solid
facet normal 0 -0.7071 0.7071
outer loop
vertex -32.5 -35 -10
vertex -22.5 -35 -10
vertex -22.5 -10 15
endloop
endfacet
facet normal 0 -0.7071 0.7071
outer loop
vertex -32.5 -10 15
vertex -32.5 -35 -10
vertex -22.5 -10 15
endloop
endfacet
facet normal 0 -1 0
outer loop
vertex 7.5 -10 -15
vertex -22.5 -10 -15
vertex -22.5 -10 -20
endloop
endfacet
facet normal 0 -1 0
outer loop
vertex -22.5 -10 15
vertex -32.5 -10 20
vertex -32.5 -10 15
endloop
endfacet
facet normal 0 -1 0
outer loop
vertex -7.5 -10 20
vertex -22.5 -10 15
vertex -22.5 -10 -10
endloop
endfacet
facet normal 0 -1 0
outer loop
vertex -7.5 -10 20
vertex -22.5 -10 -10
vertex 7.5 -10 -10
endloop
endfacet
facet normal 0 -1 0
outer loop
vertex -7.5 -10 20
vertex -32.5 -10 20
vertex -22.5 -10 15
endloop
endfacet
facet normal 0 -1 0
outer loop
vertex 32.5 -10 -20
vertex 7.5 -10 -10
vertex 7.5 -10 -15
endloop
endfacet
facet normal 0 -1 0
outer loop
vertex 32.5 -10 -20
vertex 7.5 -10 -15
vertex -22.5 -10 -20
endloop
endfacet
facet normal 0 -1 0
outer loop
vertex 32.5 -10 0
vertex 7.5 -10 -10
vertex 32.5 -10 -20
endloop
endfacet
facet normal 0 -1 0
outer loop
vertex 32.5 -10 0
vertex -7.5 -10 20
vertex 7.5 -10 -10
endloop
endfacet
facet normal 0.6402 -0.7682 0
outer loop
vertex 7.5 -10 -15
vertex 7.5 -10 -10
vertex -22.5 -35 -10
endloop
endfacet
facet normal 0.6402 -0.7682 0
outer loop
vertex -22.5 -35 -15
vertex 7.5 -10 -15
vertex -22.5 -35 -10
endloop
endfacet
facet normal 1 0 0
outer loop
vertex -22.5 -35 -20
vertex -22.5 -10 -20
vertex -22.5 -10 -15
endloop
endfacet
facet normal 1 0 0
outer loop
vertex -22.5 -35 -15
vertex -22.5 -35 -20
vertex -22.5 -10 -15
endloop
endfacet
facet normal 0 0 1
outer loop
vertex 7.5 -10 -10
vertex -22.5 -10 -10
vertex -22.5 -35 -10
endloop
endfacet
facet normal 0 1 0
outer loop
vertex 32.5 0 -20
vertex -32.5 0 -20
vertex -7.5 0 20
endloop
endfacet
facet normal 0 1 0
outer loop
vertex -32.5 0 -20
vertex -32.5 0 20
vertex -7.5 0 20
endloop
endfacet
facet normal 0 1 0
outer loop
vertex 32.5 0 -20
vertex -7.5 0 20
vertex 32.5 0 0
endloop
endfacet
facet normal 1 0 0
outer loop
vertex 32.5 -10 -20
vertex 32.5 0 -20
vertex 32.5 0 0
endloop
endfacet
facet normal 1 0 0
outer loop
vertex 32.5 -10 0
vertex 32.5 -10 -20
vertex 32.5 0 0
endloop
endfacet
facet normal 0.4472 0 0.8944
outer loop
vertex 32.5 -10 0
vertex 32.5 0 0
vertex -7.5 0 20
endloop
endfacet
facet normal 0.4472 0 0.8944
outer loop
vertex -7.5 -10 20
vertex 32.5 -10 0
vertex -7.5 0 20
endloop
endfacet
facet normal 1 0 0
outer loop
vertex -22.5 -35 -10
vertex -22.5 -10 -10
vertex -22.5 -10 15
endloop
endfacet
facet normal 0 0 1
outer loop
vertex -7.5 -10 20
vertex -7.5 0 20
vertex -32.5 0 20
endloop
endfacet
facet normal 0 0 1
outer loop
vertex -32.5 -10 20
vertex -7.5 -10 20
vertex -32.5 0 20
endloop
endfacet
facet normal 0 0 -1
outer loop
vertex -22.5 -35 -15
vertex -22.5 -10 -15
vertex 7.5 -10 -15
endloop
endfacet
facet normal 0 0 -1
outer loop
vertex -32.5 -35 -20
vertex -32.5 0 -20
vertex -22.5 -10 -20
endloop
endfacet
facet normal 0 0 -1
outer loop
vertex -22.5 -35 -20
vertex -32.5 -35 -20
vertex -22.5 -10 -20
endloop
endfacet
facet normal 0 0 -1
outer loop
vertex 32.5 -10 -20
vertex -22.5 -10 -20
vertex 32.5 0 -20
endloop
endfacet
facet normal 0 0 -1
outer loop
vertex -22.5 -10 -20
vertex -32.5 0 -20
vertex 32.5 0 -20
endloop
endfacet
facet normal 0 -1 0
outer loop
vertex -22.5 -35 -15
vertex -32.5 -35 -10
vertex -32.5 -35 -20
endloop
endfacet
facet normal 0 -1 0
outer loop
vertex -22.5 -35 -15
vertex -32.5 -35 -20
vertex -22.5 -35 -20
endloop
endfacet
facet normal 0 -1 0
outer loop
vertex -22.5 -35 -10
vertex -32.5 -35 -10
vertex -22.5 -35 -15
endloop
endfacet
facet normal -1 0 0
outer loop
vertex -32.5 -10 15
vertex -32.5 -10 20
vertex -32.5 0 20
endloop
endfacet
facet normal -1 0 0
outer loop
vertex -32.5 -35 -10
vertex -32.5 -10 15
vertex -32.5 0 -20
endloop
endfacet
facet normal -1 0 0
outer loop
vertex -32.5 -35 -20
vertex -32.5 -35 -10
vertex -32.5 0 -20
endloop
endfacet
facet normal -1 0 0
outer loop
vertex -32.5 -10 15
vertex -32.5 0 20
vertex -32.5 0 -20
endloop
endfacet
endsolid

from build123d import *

# Parameters (mm, degrees)
F1_DEPTH = 10
F0_W     = 30
F0_H     = 5
F2_DEPTH = 35
F4_DEPTH = 10.001
F6_DEPTH = 10.001


with BuildPart() as f1:
    # F0 (on Front) → F1 (new body)
    with BuildSketch(Plane.XZ):
        Polygon((-7.5, 20), (-32.5, 20), (-32.5, 15), (-22.5, 15), (-22.5, -10), (7.5, -10), (7.5, -15), (-22.5, -15), (-22.5, -20), (32.5, -20), (32.5, 0), align=None)
    extrude(amount=F1_DEPTH)

    # F0 (on Front) → F2 (join)
    with BuildSketch(Plane.XZ):
        Polygon((-22.5, 15), (-32.5, 15), (-32.5, -20), (-22.5, -20), (-22.5, -15), (-22.5, -10), align=None)
        with Locations((-7.5, -12.5)):
            Rectangle(F0_W, F0_H)
    extrude(amount=F2_DEPTH)

    # F3 (on face) → F4 (cut, through all)
    with BuildSketch(Plane.XY.offset(-10)):
        Polygon((7.5, -10), (-22.5, -35), (7.5, -35), align=None)
    extrude(amount=-F4_DEPTH, mode=Mode.SUBTRACT)

    # F5 (on face) → F6 (cut, through all)
    with BuildSketch(Plane.YZ.offset(-22.5)):
        Polygon((-35, 15), (-35, -10), (-10, 15), align=None)
    extrude(amount=-F6_DEPTH, mode=Mode.SUBTRACT)


solid = f1.part
